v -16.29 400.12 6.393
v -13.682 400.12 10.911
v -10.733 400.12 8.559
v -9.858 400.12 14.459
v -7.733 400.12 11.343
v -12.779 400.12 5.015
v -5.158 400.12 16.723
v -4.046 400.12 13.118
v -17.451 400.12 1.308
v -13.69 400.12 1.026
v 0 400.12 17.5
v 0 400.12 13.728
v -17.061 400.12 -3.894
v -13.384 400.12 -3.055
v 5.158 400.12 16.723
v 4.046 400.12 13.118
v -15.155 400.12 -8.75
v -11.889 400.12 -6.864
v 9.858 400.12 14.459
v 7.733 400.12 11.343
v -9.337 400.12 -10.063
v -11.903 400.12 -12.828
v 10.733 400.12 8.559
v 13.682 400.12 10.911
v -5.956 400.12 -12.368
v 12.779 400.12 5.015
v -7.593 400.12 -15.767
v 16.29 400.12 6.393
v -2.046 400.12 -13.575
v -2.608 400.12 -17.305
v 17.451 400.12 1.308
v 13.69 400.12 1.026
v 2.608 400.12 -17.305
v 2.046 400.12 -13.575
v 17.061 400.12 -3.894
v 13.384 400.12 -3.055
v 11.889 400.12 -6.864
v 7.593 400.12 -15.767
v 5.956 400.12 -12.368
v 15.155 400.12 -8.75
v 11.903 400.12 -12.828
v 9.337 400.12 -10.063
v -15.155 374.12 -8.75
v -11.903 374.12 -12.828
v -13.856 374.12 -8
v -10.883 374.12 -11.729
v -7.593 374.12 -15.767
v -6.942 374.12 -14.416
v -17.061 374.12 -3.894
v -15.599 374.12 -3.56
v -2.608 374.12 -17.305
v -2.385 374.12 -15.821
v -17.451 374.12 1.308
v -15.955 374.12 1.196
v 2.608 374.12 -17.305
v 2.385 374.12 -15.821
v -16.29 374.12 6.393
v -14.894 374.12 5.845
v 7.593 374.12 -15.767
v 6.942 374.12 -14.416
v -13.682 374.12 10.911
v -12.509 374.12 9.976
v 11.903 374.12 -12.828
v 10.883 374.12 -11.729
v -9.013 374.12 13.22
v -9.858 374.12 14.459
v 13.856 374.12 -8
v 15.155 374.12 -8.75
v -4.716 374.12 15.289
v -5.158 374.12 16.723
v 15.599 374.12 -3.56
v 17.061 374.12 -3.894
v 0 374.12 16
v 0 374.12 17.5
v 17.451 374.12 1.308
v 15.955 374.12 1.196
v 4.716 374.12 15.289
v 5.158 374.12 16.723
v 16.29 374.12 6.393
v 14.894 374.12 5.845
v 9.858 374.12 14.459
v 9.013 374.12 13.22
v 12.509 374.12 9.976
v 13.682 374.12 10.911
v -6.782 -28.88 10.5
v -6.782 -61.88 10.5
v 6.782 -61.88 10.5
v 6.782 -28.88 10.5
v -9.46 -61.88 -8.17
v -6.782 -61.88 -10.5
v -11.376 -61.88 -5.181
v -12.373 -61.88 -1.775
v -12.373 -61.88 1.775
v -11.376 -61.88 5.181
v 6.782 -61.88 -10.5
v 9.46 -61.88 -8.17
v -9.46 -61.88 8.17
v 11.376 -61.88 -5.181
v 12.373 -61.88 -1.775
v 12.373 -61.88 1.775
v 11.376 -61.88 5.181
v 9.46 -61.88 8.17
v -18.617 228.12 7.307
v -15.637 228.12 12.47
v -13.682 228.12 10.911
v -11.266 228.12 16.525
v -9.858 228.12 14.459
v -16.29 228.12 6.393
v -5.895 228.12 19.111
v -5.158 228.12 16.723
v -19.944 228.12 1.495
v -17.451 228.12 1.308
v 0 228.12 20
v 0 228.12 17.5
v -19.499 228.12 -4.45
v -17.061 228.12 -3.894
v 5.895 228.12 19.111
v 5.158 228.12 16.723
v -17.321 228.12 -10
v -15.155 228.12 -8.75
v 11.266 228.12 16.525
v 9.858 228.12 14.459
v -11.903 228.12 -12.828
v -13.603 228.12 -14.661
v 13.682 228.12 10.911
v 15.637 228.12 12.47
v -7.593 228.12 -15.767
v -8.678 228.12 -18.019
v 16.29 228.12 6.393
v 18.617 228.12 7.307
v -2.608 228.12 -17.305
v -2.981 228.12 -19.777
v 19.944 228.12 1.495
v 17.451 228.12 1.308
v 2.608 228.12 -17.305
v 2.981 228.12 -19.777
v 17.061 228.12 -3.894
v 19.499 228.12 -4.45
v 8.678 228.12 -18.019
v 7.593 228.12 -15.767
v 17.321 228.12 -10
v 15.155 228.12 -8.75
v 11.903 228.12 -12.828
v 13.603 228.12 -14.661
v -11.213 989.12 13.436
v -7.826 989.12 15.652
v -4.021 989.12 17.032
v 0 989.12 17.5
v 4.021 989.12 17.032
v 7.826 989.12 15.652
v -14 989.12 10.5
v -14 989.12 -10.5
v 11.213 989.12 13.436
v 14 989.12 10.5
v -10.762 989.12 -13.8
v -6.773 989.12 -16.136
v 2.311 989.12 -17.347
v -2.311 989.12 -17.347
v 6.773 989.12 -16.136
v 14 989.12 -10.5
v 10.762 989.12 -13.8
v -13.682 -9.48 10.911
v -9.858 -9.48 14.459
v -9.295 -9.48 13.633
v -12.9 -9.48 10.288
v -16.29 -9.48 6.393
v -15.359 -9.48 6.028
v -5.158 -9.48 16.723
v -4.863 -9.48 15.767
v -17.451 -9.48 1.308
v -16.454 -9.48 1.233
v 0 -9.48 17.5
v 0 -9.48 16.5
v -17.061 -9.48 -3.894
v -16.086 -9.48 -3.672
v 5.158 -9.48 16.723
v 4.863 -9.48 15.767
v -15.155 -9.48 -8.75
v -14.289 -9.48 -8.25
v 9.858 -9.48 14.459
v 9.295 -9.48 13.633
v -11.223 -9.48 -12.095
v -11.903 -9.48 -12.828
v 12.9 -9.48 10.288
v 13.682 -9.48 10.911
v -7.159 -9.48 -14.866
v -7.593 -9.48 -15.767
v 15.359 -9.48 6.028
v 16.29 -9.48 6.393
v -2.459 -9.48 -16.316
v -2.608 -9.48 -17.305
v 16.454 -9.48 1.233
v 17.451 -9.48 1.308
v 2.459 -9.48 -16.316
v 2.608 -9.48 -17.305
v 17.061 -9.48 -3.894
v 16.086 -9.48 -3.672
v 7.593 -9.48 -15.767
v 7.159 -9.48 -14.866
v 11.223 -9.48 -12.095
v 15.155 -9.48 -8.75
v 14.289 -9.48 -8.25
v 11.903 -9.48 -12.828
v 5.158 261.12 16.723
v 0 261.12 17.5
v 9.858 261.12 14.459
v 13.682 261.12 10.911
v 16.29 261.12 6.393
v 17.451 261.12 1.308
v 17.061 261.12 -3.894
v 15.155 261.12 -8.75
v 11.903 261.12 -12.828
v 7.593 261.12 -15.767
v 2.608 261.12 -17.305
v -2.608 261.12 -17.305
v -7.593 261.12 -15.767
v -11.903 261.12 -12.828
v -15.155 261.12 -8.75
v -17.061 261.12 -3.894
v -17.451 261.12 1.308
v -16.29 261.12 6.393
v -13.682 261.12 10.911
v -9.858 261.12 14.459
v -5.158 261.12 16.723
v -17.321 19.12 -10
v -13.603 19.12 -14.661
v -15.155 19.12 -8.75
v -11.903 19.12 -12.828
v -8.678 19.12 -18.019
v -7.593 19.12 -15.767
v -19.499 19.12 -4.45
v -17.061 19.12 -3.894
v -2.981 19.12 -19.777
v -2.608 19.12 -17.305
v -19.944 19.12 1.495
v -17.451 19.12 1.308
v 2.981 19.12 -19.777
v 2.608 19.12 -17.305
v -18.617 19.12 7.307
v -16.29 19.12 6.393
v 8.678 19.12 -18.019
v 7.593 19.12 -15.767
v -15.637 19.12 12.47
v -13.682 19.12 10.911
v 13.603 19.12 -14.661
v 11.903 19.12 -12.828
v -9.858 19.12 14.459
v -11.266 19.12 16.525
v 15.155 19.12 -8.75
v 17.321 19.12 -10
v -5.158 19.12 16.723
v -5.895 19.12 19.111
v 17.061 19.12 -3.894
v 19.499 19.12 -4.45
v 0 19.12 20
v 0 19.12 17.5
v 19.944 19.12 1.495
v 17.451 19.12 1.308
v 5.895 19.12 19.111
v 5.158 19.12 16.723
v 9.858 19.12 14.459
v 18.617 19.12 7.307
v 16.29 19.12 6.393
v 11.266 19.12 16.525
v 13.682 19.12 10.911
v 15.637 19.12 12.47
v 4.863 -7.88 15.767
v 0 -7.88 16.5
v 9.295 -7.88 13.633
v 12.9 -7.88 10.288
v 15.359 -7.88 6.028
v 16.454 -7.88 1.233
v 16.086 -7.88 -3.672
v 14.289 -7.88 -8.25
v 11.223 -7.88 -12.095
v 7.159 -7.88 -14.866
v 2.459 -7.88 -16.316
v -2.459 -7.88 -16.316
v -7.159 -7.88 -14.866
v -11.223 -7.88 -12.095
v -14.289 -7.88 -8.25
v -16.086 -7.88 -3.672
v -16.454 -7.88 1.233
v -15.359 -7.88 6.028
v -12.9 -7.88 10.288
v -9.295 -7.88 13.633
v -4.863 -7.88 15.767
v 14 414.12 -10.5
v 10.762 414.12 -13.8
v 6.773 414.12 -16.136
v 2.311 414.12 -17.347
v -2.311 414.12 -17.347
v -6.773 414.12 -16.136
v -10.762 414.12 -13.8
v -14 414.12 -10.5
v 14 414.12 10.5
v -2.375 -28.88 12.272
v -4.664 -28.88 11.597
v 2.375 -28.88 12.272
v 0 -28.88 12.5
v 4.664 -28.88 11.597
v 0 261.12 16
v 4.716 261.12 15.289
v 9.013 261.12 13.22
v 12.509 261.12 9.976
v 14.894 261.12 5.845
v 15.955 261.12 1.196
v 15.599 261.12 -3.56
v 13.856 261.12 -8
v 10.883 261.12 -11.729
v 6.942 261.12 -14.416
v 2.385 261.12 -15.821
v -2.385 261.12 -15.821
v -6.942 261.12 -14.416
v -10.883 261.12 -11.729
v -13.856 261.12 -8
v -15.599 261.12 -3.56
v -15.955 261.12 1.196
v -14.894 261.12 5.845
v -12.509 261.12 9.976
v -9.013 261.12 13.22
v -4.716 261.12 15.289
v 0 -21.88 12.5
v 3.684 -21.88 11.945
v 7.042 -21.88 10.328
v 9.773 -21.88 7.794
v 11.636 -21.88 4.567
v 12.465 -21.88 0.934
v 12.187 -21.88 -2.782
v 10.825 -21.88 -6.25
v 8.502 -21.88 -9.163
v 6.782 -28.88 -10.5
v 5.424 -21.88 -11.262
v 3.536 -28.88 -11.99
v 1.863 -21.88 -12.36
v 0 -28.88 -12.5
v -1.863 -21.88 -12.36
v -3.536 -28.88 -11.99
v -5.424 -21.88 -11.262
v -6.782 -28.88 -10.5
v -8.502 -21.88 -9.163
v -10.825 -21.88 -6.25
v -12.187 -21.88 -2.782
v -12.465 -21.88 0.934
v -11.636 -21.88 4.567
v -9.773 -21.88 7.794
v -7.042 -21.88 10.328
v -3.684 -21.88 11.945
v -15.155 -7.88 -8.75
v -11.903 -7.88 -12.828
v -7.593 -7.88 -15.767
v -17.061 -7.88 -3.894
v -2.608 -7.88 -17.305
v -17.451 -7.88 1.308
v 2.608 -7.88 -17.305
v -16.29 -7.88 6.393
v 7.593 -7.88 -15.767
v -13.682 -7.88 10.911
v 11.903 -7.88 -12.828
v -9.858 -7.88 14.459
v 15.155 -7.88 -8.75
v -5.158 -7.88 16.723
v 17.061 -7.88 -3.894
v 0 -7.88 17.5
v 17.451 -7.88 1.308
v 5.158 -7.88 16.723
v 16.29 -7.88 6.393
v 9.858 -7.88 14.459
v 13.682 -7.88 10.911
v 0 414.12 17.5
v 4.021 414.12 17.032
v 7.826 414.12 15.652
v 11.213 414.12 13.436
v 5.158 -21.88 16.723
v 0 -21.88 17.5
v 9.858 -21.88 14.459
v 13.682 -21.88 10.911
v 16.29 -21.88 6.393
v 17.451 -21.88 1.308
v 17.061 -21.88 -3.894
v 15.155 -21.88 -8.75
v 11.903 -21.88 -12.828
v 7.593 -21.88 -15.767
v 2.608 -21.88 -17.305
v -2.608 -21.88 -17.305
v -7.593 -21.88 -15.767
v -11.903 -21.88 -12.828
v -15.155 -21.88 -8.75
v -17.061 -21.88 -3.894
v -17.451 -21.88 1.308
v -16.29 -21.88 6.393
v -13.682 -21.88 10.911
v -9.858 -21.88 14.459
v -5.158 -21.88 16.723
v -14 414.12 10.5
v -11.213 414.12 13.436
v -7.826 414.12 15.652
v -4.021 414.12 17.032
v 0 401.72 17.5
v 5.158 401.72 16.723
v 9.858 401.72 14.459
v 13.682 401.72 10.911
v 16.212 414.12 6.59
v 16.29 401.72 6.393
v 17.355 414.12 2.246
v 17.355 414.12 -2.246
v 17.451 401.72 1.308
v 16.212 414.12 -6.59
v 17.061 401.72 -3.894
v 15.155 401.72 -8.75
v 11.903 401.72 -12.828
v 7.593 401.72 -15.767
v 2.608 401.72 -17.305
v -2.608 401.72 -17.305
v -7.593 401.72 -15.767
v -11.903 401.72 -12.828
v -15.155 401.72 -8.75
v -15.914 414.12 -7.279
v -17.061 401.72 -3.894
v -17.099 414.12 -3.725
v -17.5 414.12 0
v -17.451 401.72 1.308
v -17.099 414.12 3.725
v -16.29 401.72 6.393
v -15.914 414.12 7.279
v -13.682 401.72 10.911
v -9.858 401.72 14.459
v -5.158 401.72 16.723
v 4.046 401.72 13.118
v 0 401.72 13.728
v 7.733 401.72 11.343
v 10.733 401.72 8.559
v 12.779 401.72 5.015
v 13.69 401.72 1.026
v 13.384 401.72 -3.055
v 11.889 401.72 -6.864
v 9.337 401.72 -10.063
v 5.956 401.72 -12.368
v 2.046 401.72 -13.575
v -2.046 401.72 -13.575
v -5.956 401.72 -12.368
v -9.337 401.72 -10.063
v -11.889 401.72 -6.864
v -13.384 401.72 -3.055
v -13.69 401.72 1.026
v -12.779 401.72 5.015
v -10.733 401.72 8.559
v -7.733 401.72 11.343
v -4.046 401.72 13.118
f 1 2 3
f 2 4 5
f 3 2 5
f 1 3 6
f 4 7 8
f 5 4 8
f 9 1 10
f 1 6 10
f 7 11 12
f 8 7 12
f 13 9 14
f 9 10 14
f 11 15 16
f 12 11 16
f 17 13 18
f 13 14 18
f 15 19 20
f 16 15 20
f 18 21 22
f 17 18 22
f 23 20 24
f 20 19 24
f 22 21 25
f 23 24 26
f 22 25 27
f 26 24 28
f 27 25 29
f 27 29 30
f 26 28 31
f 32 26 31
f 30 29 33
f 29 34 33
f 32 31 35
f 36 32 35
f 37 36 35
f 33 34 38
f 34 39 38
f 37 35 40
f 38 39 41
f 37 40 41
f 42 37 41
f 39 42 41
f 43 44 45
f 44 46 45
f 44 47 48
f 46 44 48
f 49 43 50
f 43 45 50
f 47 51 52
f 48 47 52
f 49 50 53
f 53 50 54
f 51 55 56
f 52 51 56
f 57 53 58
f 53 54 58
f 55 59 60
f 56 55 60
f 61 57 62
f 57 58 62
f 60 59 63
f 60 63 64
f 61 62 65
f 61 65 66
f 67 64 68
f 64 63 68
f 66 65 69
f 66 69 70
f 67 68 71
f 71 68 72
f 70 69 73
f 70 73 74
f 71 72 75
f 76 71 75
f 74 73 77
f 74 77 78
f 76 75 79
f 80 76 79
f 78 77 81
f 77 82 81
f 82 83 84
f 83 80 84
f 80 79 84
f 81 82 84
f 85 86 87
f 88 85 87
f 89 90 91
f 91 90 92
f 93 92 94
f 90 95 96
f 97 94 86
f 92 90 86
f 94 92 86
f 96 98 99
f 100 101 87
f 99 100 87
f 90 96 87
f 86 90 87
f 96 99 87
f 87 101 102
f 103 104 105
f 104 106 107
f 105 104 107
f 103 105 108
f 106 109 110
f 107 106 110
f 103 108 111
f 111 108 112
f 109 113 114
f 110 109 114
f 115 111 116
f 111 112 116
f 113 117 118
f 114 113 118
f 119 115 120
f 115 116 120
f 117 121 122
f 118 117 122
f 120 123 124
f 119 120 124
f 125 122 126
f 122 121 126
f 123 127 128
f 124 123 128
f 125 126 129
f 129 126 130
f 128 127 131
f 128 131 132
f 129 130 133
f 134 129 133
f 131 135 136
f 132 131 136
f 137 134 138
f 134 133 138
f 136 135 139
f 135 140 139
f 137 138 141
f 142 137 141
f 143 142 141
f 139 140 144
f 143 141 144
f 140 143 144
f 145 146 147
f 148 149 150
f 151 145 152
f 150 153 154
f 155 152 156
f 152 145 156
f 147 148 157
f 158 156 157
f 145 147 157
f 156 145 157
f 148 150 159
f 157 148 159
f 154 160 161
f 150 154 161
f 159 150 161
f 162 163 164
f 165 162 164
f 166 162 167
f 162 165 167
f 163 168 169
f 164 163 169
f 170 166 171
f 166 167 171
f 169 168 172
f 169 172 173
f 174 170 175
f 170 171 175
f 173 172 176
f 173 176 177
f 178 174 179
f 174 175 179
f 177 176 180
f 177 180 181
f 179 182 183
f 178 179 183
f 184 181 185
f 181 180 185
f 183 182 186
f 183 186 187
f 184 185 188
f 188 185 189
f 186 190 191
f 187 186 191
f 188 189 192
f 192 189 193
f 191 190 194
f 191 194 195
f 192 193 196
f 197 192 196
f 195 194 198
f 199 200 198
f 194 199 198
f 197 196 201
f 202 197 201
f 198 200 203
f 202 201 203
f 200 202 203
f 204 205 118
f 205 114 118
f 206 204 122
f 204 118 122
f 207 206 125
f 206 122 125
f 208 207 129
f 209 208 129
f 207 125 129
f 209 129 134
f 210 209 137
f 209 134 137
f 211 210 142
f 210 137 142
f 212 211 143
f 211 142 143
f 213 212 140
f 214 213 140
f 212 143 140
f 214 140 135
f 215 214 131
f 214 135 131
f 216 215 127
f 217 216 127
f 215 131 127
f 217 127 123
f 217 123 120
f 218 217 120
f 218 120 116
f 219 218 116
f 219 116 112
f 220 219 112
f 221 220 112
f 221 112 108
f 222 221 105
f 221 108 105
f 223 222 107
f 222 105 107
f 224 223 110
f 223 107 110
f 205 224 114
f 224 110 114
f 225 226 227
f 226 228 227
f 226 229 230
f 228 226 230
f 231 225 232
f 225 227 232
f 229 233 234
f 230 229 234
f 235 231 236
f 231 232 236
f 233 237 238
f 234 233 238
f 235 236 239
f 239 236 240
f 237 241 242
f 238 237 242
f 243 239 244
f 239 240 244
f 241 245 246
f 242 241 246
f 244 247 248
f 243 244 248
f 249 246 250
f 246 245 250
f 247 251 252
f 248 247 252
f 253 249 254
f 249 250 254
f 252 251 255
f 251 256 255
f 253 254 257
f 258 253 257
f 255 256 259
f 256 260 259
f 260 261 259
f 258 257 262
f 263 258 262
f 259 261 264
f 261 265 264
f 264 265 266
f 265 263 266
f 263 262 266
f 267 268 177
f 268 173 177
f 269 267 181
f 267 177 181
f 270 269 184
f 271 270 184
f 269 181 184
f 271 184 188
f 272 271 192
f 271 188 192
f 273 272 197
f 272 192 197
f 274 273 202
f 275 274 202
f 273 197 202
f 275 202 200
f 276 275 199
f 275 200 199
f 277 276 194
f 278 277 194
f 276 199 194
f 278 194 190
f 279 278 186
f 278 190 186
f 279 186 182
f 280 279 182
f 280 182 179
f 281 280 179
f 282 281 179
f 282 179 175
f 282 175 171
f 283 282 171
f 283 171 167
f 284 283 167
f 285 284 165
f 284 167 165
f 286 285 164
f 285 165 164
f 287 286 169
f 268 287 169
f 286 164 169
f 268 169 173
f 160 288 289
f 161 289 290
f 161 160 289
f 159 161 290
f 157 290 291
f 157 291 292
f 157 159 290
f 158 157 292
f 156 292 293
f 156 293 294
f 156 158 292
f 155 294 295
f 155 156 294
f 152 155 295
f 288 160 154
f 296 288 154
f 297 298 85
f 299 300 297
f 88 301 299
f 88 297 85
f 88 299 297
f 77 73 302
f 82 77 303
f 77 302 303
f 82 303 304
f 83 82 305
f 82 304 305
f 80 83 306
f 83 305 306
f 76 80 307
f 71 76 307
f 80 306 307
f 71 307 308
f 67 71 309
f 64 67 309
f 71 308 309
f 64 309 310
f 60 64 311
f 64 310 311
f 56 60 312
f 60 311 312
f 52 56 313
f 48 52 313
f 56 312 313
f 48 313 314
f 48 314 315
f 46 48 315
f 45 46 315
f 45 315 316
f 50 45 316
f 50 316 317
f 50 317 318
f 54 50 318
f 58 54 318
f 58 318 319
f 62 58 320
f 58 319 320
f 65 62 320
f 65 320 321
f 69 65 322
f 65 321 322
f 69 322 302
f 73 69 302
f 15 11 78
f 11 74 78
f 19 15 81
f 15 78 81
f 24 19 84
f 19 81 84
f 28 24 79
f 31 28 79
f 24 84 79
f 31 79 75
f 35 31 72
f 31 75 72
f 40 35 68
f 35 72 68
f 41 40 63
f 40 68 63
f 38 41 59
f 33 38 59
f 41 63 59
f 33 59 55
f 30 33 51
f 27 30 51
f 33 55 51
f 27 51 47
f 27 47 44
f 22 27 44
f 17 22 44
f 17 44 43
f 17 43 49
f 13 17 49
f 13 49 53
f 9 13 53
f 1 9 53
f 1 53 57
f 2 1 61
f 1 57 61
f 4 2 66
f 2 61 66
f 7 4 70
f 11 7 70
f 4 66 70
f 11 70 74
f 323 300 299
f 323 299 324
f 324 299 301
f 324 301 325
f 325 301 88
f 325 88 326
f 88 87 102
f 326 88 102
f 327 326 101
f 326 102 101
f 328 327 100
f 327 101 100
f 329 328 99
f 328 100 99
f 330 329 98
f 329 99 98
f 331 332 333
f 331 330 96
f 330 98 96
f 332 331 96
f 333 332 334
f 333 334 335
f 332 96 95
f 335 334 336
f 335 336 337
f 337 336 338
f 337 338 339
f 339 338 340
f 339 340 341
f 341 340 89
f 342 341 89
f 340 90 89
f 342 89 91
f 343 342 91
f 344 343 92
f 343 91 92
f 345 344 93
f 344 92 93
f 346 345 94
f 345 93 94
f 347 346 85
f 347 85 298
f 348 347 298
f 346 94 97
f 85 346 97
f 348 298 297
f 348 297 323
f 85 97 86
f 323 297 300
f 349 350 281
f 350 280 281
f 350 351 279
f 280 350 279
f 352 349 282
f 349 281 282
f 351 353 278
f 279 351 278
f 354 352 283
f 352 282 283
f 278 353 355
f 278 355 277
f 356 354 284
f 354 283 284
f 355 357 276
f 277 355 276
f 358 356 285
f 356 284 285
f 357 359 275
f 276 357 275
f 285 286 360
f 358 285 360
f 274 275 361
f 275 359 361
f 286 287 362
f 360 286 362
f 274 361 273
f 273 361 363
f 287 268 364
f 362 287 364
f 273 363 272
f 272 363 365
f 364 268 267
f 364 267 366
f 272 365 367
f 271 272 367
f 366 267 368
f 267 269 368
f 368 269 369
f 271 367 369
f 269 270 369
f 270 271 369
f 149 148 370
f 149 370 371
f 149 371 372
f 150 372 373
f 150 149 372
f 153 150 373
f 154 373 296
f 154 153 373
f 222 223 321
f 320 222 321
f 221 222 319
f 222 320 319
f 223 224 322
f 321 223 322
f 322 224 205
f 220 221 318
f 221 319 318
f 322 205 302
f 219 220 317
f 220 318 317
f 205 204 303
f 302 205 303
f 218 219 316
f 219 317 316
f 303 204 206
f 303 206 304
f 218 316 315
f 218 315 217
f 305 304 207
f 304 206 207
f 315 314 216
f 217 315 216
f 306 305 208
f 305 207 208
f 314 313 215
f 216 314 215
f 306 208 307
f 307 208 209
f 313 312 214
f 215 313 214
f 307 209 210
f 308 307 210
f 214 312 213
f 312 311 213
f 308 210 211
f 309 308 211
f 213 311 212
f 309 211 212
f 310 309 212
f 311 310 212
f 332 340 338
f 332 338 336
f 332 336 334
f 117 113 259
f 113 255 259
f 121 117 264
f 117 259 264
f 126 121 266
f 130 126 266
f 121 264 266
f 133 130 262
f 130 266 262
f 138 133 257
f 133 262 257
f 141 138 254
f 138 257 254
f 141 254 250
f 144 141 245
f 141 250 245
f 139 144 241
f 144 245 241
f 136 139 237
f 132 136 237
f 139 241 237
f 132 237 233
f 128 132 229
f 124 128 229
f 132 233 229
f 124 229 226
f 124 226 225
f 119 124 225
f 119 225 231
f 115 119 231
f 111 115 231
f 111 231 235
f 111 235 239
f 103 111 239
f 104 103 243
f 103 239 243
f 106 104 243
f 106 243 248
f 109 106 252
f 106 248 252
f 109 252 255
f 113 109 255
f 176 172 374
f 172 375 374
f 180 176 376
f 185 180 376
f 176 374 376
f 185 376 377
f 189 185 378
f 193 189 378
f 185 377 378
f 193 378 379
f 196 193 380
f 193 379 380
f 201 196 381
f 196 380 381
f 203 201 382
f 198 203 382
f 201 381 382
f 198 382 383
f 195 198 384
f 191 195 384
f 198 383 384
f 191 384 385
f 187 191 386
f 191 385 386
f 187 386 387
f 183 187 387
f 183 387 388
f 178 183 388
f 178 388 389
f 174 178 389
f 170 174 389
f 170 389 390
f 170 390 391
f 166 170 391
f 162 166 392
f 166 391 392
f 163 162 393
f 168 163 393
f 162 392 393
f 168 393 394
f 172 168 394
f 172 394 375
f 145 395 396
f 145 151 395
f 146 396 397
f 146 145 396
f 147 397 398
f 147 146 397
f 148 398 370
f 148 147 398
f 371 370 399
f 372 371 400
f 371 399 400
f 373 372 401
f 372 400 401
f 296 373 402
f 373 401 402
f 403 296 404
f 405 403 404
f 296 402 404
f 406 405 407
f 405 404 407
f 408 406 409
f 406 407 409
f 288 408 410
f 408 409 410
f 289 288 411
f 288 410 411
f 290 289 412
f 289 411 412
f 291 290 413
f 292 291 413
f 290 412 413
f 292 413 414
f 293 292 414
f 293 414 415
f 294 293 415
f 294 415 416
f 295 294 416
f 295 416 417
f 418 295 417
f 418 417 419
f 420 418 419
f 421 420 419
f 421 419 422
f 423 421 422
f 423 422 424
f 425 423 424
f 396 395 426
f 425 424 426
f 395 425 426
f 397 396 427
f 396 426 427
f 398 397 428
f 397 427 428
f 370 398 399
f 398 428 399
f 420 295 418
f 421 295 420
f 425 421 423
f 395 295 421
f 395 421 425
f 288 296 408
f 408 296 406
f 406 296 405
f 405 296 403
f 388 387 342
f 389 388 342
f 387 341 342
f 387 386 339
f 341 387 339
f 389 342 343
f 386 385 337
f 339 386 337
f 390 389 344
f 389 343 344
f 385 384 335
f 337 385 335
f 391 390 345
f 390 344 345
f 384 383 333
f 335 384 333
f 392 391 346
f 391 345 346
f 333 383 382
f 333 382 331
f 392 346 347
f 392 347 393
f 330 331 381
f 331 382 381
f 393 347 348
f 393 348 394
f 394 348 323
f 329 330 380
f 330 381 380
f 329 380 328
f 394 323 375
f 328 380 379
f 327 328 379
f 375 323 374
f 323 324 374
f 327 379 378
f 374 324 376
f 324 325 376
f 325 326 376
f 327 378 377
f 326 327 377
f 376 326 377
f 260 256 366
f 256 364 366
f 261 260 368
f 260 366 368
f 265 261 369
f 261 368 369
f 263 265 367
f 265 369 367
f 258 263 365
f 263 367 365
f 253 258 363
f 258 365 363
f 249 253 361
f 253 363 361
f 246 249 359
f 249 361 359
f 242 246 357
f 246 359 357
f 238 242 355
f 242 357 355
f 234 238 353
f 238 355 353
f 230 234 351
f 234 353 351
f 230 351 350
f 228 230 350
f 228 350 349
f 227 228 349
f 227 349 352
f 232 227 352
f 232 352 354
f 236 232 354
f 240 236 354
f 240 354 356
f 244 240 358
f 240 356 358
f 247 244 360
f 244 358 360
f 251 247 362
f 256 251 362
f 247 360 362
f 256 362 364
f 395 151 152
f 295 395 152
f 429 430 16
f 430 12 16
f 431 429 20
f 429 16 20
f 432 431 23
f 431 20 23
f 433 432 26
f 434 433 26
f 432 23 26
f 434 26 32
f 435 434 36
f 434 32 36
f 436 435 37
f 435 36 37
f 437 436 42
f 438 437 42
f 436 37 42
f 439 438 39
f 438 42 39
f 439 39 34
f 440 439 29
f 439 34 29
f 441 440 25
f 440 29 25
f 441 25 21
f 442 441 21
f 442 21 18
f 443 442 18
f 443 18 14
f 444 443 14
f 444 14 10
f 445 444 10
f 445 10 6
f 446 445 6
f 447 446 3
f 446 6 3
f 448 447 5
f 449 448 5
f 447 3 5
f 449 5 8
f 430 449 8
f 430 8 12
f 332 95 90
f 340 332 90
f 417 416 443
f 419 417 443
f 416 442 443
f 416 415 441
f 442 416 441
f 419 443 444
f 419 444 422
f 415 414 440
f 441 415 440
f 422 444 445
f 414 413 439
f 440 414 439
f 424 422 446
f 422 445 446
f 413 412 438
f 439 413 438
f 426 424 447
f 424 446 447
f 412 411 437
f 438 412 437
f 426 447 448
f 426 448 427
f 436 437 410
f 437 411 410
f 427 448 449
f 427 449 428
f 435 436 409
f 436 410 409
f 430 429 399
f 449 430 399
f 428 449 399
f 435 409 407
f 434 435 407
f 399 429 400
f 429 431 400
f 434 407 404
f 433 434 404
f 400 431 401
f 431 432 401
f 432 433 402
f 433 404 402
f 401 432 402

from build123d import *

# Parameters (mm, degrees)
F3_DEPTH = 33
F0_W     = 575
F0_H     = 17.5
F7_DEPTH = 575


with BuildPart() as f1:
    # F0 (on Right) → F1 (revolve)
    with BuildSketch(Plane.YZ):
        Polygon((-9.479858, 17.5), (-21.879858, 17.5), (-21.879858, 12.5), (-61.879858, 12.5), (-61.879858, 0), (-21.879858, 0), (19.120142, 0), (19.120142, 17.5), (-7.879858, 17.5), (-7.879858, 16.5), (-9.479858, 16.5), align=None)
    revolve(axis=Axis((0, 215.2909, 0), (0, 1, 0)))

    # F2 (on face) → F3 (cut)
    with BuildSketch(Plane.XZ.offset(61.879858)):
        with BuildLine():
            ThreePointArc((6.78233, 10.5), (0, 12.5), (-6.78233, 10.5))
            Line((-6.78233, 10.5), (6.78233, 10.5))
        make_face()
        with BuildLine():
            Line((6.78233, -10.5), (-6.78233, -10.5))
            ThreePointArc((-6.78233, -10.5), (0, -12.5), (6.78233, -10.5))
        make_face()
    extrude(amount=-F3_DEPTH, mode=Mode.SUBTRACT)

    # F0 (on Right) → F4 (revolve)
    with BuildSketch(Plane.YZ):
        Polygon((19.120142, 20), (19.120142, 17.5), (19.120142, 0), (414.120142, 0), (414.120142, 17.5), (401.720142, 17.5), (401.720142, 13.727913), (400.120142, 13.727913), (400.120142, 17.5), (374.120142, 17.5), (374.120142, 16), (261.120142, 16), (261.120142, 17.5), (228.120142, 17.5), (228.120142, 20), align=None)
    revolve(axis=Axis((0, 216.620142, 0), (0, 1, 0)))

    # F0 (on Right) → F5 (revolve)
    with BuildSketch(Plane.YZ):
        with Locations((701.620142, 8.75)):
            Rectangle(F0_W, F0_H)
    revolve(axis=Axis((0, 701.620142, 0), (0, 1, 0)))

    # F6 (on face) → F7 (cut)
    with BuildSketch(Plane(origin=(0, 989.120142, 0), x_dir=(-1, 0, 0), z_dir=(0, 1, 0))):
        with BuildLine():
            ThreePointArc((17.5, 0), (16.601958, 5.533986), (14, 10.5))
            Line((14, 10.5), (14, -10.5))
            ThreePointArc((14, -10.5), (16.601958, -5.533986), (17.5, 0))
        make_face()
        with BuildLine():
            Line((-14, -10.5), (-14, 10.5))
            ThreePointArc((-14, 10.5), (-17.5, 0), (-14, -10.5))
        make_face()
    extrude(amount=-F7_DEPTH, mode=Mode.SUBTRACT)


solid = f1.part
